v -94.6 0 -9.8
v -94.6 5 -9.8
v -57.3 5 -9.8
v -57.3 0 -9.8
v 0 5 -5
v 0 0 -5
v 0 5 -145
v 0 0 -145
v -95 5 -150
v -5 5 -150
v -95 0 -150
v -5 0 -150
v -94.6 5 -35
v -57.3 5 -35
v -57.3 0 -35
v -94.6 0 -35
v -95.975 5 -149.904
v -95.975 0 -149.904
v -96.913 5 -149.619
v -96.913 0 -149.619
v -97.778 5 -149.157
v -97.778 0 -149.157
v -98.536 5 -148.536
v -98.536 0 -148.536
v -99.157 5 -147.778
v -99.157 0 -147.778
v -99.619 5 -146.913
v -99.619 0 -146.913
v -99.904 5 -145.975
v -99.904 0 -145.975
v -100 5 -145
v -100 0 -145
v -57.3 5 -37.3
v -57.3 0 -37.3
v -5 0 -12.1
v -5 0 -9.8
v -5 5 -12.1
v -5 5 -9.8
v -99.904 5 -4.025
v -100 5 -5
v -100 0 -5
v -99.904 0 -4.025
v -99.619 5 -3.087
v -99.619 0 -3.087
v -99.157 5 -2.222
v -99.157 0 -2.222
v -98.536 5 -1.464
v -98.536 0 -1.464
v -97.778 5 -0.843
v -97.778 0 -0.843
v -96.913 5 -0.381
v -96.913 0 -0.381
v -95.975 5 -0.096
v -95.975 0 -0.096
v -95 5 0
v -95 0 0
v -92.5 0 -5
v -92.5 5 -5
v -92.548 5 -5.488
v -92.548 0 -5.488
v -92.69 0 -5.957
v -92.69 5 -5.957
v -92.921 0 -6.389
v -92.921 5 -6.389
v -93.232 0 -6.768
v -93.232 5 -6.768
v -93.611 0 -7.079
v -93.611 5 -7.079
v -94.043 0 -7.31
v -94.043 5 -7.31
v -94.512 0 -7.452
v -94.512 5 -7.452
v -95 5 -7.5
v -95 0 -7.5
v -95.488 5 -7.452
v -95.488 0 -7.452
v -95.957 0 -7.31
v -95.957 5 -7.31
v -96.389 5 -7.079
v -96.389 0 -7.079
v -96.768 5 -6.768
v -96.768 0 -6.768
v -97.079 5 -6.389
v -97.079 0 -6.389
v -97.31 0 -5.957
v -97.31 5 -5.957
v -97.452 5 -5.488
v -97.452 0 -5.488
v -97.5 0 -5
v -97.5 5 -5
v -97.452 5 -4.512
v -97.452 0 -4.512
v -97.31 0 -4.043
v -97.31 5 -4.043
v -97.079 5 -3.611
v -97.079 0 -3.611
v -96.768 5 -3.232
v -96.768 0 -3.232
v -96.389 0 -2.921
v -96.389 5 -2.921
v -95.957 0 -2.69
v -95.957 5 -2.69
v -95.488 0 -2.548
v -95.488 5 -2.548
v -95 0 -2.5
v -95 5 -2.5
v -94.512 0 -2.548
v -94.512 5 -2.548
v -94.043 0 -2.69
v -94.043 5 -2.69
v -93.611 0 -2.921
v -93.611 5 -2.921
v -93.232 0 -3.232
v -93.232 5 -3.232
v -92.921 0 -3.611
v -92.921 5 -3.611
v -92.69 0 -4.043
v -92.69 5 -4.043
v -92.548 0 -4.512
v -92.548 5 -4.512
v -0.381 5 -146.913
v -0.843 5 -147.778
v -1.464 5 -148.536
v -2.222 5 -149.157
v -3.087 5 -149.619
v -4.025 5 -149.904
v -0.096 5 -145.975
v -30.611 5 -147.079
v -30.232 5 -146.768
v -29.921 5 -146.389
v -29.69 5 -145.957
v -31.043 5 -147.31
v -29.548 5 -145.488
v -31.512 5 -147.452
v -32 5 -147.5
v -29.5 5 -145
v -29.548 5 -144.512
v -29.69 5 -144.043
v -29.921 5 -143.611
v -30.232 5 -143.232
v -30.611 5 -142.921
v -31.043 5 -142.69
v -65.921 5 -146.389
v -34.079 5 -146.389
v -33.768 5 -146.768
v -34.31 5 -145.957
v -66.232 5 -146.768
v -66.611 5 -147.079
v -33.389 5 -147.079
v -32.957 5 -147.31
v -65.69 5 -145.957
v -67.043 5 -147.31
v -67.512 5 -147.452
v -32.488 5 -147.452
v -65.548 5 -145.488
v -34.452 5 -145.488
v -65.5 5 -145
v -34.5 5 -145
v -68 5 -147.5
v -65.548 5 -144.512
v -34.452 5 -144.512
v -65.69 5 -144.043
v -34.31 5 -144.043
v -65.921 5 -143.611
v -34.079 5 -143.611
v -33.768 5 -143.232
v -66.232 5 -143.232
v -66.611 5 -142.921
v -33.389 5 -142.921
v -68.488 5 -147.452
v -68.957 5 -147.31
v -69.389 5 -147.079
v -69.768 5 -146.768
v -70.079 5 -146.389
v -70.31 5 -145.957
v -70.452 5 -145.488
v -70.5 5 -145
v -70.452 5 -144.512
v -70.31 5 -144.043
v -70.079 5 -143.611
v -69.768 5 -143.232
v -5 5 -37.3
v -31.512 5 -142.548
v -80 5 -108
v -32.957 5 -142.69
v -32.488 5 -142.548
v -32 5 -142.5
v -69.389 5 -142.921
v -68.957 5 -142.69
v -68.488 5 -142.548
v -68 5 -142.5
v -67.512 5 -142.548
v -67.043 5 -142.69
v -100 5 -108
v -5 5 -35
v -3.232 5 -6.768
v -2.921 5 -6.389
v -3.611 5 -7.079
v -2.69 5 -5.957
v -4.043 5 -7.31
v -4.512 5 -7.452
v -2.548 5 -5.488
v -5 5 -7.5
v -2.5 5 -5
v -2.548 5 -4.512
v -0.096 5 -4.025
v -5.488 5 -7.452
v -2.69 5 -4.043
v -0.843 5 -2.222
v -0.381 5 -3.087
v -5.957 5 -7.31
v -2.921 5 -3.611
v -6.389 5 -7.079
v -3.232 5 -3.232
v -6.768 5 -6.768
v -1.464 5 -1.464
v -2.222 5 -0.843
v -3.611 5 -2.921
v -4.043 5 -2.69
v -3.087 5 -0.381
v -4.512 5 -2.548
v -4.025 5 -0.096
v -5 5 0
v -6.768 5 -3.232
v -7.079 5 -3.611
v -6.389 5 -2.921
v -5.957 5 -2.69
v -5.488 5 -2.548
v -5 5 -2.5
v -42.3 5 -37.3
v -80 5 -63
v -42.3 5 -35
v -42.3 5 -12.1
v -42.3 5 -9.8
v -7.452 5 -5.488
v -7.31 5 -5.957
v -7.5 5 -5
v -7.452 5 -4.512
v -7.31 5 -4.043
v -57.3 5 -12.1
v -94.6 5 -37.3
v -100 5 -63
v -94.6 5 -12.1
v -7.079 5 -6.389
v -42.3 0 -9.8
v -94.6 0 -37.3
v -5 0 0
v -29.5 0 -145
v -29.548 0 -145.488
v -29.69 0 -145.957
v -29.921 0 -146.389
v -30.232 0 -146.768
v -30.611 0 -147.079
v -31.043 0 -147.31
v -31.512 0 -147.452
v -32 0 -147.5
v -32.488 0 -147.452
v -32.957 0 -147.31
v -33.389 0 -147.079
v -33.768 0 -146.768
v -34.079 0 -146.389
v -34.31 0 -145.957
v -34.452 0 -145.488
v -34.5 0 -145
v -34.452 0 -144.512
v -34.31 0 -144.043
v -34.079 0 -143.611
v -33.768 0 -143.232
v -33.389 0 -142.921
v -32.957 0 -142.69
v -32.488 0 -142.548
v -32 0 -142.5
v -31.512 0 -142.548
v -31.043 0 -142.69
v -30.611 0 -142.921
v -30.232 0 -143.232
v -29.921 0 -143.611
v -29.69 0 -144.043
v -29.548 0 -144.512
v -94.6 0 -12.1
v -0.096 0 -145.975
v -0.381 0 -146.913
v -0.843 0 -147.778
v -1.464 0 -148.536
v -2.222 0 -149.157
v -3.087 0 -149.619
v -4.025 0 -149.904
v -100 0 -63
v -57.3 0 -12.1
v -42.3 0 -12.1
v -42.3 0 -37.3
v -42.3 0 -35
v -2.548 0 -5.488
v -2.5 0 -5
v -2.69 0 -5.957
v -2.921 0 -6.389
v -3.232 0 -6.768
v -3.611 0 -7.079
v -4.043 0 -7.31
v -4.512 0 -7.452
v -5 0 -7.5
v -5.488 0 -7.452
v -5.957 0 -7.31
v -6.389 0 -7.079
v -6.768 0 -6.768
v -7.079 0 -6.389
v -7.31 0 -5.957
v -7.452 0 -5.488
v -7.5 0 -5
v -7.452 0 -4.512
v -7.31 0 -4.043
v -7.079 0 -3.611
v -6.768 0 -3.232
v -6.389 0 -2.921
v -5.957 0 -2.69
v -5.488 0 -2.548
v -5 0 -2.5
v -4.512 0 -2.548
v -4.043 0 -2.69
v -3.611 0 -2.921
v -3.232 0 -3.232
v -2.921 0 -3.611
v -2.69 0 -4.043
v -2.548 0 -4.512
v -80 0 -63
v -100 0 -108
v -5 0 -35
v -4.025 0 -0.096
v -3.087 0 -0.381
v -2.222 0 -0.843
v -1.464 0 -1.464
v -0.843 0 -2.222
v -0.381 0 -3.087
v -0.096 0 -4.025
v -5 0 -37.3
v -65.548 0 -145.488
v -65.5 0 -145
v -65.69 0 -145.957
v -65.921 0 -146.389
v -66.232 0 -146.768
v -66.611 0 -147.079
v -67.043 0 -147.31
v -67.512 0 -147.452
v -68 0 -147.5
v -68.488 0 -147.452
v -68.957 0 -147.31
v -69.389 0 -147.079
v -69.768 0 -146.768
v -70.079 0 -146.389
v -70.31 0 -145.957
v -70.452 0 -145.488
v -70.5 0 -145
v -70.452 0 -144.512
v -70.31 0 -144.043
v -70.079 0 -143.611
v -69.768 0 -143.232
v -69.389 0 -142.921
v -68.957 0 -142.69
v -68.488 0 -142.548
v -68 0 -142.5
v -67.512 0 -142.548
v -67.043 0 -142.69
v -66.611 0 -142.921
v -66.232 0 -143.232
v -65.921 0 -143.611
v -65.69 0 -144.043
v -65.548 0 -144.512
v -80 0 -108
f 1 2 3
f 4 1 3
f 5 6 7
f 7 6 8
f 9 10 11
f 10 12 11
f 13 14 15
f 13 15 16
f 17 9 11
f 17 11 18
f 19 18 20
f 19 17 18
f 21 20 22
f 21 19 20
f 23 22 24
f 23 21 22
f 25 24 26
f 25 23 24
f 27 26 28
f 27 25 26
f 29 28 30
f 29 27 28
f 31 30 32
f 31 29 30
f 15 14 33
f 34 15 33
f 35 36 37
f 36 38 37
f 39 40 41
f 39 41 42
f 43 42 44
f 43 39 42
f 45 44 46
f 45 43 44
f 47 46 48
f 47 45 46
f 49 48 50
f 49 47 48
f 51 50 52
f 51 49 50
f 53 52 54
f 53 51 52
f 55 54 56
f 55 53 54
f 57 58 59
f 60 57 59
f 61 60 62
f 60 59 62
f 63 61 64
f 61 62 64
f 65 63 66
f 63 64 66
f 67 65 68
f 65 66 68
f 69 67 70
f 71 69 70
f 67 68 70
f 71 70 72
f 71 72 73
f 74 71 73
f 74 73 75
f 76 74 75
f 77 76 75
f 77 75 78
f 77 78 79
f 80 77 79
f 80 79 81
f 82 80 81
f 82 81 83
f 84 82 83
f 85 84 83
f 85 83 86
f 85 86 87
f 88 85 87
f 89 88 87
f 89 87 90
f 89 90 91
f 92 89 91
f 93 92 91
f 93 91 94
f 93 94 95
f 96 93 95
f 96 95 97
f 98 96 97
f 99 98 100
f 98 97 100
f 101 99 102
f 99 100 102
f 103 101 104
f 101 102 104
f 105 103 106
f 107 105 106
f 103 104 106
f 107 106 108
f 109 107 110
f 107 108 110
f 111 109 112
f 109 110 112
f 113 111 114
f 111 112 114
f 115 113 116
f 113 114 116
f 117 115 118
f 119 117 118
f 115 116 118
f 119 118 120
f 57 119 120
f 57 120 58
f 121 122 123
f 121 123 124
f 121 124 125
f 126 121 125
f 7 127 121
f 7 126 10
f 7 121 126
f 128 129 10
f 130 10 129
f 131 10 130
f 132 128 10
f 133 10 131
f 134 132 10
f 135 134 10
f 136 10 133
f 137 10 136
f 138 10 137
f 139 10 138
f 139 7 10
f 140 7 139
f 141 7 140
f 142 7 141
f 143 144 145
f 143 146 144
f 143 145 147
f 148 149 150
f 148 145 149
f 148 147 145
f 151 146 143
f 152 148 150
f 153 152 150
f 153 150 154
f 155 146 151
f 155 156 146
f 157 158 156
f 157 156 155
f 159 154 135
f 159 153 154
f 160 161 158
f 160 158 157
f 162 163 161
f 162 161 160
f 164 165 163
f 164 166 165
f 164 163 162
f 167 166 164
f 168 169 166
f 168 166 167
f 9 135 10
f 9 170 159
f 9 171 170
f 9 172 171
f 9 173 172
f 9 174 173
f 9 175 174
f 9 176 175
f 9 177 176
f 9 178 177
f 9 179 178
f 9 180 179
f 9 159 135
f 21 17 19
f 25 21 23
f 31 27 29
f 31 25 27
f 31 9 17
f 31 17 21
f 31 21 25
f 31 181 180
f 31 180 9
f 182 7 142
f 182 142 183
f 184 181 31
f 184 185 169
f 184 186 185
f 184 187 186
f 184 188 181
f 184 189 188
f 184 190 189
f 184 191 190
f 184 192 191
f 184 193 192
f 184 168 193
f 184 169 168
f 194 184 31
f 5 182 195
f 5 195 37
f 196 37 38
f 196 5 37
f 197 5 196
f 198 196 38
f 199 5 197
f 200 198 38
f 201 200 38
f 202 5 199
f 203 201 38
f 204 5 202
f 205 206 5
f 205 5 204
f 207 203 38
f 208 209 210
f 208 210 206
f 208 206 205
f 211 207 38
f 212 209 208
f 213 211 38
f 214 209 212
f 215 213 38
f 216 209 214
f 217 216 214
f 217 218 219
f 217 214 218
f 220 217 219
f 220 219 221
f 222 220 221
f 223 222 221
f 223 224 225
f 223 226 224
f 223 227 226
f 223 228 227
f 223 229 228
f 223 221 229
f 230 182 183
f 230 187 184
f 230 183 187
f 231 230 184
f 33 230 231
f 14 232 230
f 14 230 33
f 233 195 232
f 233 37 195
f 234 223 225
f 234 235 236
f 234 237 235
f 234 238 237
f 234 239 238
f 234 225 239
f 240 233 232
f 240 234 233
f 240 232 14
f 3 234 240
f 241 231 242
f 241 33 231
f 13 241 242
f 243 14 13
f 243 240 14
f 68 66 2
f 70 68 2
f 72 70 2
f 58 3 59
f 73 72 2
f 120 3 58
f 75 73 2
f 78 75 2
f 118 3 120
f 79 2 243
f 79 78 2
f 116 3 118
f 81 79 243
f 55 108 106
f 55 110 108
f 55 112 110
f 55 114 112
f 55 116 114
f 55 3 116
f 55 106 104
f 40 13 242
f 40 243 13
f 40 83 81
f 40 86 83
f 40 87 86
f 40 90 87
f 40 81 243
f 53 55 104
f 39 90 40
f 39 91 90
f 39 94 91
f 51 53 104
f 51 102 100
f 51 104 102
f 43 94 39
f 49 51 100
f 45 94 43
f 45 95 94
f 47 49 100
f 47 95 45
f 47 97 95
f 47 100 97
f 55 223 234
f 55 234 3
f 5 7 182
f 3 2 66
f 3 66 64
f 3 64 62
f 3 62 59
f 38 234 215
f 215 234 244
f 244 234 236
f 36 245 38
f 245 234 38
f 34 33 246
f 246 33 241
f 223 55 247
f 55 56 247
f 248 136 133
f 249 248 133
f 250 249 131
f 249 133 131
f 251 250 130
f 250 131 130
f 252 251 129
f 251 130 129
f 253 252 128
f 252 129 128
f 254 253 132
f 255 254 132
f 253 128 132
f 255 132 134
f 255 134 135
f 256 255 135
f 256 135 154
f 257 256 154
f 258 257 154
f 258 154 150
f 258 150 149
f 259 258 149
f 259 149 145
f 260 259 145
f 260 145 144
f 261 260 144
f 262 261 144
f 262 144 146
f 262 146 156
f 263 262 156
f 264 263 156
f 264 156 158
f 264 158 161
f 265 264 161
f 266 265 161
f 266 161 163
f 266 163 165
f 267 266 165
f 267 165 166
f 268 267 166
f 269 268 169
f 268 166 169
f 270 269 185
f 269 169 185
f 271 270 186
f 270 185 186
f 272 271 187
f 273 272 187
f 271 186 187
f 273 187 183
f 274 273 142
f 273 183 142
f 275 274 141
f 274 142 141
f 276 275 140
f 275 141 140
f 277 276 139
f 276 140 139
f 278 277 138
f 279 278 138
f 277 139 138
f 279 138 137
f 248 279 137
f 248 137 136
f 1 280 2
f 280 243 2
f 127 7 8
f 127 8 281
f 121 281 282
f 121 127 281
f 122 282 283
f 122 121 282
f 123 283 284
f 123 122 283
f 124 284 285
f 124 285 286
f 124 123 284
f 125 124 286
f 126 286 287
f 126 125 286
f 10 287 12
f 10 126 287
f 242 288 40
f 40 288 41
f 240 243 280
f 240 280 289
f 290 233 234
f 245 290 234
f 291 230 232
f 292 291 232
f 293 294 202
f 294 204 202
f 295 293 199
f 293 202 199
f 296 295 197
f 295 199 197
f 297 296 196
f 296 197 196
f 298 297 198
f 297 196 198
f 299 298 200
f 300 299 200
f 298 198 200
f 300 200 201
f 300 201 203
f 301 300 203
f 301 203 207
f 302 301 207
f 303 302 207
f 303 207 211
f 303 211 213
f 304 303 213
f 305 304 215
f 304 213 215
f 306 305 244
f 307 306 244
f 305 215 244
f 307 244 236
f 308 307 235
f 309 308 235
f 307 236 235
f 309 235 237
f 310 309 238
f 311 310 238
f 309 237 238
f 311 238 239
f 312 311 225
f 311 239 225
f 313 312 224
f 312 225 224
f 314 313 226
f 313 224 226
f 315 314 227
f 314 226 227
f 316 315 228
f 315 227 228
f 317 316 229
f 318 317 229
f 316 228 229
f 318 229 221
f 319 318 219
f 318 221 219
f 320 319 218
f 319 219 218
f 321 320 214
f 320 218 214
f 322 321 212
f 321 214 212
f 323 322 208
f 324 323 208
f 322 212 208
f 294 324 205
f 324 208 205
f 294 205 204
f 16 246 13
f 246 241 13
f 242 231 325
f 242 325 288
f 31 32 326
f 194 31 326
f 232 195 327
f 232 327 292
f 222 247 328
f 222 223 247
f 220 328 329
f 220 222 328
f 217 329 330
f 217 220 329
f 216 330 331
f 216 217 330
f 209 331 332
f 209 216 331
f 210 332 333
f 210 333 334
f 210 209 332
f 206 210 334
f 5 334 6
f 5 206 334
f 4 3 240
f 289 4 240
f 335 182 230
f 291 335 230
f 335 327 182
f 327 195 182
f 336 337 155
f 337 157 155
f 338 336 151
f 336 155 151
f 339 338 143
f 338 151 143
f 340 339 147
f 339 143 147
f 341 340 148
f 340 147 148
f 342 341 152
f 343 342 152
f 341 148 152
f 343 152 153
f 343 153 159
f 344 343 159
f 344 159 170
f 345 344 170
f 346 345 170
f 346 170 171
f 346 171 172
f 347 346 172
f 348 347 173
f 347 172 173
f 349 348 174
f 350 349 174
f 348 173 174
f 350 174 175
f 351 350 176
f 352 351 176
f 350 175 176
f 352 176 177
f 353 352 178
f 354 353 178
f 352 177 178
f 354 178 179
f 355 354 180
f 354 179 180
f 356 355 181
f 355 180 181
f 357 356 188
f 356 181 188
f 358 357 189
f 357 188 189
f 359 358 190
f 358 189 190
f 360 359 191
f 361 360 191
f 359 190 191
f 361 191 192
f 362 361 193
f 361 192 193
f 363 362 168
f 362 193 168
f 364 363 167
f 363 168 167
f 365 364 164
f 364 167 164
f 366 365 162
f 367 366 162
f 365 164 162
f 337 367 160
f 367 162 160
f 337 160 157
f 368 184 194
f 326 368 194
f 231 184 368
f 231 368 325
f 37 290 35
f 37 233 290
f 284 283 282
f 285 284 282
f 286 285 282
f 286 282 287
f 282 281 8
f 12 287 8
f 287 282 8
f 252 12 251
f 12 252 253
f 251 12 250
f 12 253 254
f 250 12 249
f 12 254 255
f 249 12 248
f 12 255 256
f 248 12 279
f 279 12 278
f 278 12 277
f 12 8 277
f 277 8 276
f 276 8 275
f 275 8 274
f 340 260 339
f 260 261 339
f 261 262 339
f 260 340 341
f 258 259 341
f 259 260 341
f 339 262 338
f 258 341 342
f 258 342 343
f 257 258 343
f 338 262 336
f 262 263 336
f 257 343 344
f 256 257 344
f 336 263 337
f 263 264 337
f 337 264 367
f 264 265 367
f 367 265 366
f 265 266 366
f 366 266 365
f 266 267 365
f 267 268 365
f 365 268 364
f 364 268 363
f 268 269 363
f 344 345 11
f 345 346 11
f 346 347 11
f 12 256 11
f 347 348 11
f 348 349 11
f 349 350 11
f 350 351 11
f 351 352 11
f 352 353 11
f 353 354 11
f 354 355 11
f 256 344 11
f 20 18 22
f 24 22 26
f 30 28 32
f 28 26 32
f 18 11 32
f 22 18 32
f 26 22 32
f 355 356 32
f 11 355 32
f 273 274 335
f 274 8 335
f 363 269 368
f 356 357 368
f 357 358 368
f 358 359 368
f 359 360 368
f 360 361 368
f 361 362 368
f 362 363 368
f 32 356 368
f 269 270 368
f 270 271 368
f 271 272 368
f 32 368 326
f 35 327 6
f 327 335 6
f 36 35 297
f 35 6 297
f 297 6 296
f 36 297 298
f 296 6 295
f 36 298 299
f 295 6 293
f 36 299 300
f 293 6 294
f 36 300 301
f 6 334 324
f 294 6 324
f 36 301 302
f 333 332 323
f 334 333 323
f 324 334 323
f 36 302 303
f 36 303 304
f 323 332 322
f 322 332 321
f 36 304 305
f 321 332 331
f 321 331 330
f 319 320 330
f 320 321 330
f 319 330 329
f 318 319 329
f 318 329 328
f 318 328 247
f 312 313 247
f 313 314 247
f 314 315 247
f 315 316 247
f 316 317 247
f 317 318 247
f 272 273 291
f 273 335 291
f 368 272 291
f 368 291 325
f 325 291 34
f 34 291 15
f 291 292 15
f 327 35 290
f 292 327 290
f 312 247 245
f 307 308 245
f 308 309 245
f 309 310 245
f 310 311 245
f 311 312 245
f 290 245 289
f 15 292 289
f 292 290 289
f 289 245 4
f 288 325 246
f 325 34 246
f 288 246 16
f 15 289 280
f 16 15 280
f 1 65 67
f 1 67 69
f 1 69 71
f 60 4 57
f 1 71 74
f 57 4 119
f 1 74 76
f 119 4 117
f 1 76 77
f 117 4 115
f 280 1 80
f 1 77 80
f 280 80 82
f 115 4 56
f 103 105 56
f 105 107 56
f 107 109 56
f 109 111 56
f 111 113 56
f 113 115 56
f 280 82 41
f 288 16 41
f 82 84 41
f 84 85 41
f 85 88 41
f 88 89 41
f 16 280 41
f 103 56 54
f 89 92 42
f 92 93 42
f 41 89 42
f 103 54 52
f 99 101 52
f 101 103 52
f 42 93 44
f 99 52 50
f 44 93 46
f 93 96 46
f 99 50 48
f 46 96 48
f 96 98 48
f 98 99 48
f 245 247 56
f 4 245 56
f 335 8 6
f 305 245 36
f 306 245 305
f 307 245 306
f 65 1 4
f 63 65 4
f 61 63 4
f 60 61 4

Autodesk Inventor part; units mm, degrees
ref_plane "YZ Plane" through (0, 0, 0) normal (1, 0, 0) x (0, 1, 0)
ref_plane "XZ Plane" through (0, 0, 0) normal (0, 1, 0) x (-1, 0, 0)
ref_plane "XY Plane" through (0, 0, 0) normal (0, 0, 1) x (1, 0, 0)
sketch "Esboço1" plane through (0, 0, 0) normal (0, 1, 0) x (-1, 0, 0)
  line L0 (0, 0) -> (0, -150)
  line L1 (0, -150) -> (100, -150)
  line L2 (100, -150) -> (100, 0)
  line L3 (100, 0) -> (0, 0)
  dimension "d0" = 150
  dimension "d1" = 100
extrude "Extrusão1" add sketch "Esboço1" along normal blind 5
fillet "Arredondamento1" radius 5 1 edges at (0, 2.5, 0)
fillet "Arredondamento2" radius 5 1 edges at (-100, 2.5, 0)
fillet "Arredondamento3" radius 5 2 edges at (-100, 2.5, -150) (0, 2.5, -150)
sketch "Esboço2" plane through (0, 5, 0) normal (0, 1, 0) x (1, 0, 0)
  circle A0 centre (-5, 5) radius 2.5
  circle A1 centre (-95, 5) radius 2.5
  circle A2 centre (-68, 145) radius 2.5
  circle A3 centre (-32, 145) radius 2.5
  circle A4 centre (-5, 5) radius 2.5
  dimension "d26" = 5
  dimension "d28" = 5
  dimension "d41" = 5
  dimension "d42" = 5
sketch "Esboço3" plane through (0, 5, 0) normal (0, 1, 0) x (1, 0, 0)
  line L0 (-5, 150) -> (-95, 150) projected
  line L1 (-80, 108) -> (-80, 63)
  line L2 (-100, 145) -> (-100, 5) projected
  line L3 (-80, 108) -> (-106.6116, 108)
  line L4 (-80, 63) -> (-106.6116, 63)
  circle A0 centre (-32, 145) radius 2.5 projected
  line L5 (-67.9453, 145) -> (-32, 145)
  point P0 (0, 0)
  point P1 (-100, 108)
  point P2 (-100, 63)
  point P3 (-100, 108)
  point P4 (-100, 63)
  dimension "d53" = 45
extrude "Extrusão9" cut sketch "Esboço3" against normal through all contours L1 L4 L2 L3
extrude "Extrusão10" cut sketch "Esboço2" against normal through all
sketch "Esboço4" plane through (0, 5, 0) normal (0, 1, 0) x (1, 0, 0)
  line L0 (-95, 0) -> (-5, 0) projected
  line L1 (-5, 34.9997) -> (-42.3, 34.9997)
  line L2 (-42.3, 12.0997) -> (-5, 12.0997)
  line L3 (-42.3, 12.0997) -> (-42.3, 9.7997)
  line L4 (-42.3, 9.7997) -> (-5, 9.7997)
  line L5 (-5, 9.7997) -> (-5, 12.0997)
  line L6 (-5, 34.9997) -> (-5, 37.2997)
  line L7 (-5, 37.2997) -> (-42.3, 37.2997)
  line L8 (-42.3, 37.2997) -> (-42.3, 34.9997)
  line L9 (-57.3, 34.9997) -> (-94.6, 34.9997)
  line L10 (-94.6, 12.0997) -> (-57.3, 12.0997)
  line L11 (-94.6, 12.0997) -> (-94.6, 9.7997)
  line L12 (-94.6, 9.7997) -> (-57.3, 9.7997)
  line L13 (-57.3, 9.7997) -> (-57.3, 12.0997)
  line L14 (-57.3, 34.9997) -> (-57.3, 37.2997)
  line L15 (-57.3, 37.2997) -> (-94.6, 37.2997)
  line L16 (-94.6, 37.2997) -> (-94.6, 34.9997)
  point P0 (0, 0)
  dimension "d62" = 37.3
  dimension "d63" = 22.9
  dimension "d64" = 2.3
  dimension "d65" = 2.3
  dimension "d67" = 37.3
extrude "Extrusão11" cut sketch "Esboço4" against normal through all
properties part number "BaseS"
